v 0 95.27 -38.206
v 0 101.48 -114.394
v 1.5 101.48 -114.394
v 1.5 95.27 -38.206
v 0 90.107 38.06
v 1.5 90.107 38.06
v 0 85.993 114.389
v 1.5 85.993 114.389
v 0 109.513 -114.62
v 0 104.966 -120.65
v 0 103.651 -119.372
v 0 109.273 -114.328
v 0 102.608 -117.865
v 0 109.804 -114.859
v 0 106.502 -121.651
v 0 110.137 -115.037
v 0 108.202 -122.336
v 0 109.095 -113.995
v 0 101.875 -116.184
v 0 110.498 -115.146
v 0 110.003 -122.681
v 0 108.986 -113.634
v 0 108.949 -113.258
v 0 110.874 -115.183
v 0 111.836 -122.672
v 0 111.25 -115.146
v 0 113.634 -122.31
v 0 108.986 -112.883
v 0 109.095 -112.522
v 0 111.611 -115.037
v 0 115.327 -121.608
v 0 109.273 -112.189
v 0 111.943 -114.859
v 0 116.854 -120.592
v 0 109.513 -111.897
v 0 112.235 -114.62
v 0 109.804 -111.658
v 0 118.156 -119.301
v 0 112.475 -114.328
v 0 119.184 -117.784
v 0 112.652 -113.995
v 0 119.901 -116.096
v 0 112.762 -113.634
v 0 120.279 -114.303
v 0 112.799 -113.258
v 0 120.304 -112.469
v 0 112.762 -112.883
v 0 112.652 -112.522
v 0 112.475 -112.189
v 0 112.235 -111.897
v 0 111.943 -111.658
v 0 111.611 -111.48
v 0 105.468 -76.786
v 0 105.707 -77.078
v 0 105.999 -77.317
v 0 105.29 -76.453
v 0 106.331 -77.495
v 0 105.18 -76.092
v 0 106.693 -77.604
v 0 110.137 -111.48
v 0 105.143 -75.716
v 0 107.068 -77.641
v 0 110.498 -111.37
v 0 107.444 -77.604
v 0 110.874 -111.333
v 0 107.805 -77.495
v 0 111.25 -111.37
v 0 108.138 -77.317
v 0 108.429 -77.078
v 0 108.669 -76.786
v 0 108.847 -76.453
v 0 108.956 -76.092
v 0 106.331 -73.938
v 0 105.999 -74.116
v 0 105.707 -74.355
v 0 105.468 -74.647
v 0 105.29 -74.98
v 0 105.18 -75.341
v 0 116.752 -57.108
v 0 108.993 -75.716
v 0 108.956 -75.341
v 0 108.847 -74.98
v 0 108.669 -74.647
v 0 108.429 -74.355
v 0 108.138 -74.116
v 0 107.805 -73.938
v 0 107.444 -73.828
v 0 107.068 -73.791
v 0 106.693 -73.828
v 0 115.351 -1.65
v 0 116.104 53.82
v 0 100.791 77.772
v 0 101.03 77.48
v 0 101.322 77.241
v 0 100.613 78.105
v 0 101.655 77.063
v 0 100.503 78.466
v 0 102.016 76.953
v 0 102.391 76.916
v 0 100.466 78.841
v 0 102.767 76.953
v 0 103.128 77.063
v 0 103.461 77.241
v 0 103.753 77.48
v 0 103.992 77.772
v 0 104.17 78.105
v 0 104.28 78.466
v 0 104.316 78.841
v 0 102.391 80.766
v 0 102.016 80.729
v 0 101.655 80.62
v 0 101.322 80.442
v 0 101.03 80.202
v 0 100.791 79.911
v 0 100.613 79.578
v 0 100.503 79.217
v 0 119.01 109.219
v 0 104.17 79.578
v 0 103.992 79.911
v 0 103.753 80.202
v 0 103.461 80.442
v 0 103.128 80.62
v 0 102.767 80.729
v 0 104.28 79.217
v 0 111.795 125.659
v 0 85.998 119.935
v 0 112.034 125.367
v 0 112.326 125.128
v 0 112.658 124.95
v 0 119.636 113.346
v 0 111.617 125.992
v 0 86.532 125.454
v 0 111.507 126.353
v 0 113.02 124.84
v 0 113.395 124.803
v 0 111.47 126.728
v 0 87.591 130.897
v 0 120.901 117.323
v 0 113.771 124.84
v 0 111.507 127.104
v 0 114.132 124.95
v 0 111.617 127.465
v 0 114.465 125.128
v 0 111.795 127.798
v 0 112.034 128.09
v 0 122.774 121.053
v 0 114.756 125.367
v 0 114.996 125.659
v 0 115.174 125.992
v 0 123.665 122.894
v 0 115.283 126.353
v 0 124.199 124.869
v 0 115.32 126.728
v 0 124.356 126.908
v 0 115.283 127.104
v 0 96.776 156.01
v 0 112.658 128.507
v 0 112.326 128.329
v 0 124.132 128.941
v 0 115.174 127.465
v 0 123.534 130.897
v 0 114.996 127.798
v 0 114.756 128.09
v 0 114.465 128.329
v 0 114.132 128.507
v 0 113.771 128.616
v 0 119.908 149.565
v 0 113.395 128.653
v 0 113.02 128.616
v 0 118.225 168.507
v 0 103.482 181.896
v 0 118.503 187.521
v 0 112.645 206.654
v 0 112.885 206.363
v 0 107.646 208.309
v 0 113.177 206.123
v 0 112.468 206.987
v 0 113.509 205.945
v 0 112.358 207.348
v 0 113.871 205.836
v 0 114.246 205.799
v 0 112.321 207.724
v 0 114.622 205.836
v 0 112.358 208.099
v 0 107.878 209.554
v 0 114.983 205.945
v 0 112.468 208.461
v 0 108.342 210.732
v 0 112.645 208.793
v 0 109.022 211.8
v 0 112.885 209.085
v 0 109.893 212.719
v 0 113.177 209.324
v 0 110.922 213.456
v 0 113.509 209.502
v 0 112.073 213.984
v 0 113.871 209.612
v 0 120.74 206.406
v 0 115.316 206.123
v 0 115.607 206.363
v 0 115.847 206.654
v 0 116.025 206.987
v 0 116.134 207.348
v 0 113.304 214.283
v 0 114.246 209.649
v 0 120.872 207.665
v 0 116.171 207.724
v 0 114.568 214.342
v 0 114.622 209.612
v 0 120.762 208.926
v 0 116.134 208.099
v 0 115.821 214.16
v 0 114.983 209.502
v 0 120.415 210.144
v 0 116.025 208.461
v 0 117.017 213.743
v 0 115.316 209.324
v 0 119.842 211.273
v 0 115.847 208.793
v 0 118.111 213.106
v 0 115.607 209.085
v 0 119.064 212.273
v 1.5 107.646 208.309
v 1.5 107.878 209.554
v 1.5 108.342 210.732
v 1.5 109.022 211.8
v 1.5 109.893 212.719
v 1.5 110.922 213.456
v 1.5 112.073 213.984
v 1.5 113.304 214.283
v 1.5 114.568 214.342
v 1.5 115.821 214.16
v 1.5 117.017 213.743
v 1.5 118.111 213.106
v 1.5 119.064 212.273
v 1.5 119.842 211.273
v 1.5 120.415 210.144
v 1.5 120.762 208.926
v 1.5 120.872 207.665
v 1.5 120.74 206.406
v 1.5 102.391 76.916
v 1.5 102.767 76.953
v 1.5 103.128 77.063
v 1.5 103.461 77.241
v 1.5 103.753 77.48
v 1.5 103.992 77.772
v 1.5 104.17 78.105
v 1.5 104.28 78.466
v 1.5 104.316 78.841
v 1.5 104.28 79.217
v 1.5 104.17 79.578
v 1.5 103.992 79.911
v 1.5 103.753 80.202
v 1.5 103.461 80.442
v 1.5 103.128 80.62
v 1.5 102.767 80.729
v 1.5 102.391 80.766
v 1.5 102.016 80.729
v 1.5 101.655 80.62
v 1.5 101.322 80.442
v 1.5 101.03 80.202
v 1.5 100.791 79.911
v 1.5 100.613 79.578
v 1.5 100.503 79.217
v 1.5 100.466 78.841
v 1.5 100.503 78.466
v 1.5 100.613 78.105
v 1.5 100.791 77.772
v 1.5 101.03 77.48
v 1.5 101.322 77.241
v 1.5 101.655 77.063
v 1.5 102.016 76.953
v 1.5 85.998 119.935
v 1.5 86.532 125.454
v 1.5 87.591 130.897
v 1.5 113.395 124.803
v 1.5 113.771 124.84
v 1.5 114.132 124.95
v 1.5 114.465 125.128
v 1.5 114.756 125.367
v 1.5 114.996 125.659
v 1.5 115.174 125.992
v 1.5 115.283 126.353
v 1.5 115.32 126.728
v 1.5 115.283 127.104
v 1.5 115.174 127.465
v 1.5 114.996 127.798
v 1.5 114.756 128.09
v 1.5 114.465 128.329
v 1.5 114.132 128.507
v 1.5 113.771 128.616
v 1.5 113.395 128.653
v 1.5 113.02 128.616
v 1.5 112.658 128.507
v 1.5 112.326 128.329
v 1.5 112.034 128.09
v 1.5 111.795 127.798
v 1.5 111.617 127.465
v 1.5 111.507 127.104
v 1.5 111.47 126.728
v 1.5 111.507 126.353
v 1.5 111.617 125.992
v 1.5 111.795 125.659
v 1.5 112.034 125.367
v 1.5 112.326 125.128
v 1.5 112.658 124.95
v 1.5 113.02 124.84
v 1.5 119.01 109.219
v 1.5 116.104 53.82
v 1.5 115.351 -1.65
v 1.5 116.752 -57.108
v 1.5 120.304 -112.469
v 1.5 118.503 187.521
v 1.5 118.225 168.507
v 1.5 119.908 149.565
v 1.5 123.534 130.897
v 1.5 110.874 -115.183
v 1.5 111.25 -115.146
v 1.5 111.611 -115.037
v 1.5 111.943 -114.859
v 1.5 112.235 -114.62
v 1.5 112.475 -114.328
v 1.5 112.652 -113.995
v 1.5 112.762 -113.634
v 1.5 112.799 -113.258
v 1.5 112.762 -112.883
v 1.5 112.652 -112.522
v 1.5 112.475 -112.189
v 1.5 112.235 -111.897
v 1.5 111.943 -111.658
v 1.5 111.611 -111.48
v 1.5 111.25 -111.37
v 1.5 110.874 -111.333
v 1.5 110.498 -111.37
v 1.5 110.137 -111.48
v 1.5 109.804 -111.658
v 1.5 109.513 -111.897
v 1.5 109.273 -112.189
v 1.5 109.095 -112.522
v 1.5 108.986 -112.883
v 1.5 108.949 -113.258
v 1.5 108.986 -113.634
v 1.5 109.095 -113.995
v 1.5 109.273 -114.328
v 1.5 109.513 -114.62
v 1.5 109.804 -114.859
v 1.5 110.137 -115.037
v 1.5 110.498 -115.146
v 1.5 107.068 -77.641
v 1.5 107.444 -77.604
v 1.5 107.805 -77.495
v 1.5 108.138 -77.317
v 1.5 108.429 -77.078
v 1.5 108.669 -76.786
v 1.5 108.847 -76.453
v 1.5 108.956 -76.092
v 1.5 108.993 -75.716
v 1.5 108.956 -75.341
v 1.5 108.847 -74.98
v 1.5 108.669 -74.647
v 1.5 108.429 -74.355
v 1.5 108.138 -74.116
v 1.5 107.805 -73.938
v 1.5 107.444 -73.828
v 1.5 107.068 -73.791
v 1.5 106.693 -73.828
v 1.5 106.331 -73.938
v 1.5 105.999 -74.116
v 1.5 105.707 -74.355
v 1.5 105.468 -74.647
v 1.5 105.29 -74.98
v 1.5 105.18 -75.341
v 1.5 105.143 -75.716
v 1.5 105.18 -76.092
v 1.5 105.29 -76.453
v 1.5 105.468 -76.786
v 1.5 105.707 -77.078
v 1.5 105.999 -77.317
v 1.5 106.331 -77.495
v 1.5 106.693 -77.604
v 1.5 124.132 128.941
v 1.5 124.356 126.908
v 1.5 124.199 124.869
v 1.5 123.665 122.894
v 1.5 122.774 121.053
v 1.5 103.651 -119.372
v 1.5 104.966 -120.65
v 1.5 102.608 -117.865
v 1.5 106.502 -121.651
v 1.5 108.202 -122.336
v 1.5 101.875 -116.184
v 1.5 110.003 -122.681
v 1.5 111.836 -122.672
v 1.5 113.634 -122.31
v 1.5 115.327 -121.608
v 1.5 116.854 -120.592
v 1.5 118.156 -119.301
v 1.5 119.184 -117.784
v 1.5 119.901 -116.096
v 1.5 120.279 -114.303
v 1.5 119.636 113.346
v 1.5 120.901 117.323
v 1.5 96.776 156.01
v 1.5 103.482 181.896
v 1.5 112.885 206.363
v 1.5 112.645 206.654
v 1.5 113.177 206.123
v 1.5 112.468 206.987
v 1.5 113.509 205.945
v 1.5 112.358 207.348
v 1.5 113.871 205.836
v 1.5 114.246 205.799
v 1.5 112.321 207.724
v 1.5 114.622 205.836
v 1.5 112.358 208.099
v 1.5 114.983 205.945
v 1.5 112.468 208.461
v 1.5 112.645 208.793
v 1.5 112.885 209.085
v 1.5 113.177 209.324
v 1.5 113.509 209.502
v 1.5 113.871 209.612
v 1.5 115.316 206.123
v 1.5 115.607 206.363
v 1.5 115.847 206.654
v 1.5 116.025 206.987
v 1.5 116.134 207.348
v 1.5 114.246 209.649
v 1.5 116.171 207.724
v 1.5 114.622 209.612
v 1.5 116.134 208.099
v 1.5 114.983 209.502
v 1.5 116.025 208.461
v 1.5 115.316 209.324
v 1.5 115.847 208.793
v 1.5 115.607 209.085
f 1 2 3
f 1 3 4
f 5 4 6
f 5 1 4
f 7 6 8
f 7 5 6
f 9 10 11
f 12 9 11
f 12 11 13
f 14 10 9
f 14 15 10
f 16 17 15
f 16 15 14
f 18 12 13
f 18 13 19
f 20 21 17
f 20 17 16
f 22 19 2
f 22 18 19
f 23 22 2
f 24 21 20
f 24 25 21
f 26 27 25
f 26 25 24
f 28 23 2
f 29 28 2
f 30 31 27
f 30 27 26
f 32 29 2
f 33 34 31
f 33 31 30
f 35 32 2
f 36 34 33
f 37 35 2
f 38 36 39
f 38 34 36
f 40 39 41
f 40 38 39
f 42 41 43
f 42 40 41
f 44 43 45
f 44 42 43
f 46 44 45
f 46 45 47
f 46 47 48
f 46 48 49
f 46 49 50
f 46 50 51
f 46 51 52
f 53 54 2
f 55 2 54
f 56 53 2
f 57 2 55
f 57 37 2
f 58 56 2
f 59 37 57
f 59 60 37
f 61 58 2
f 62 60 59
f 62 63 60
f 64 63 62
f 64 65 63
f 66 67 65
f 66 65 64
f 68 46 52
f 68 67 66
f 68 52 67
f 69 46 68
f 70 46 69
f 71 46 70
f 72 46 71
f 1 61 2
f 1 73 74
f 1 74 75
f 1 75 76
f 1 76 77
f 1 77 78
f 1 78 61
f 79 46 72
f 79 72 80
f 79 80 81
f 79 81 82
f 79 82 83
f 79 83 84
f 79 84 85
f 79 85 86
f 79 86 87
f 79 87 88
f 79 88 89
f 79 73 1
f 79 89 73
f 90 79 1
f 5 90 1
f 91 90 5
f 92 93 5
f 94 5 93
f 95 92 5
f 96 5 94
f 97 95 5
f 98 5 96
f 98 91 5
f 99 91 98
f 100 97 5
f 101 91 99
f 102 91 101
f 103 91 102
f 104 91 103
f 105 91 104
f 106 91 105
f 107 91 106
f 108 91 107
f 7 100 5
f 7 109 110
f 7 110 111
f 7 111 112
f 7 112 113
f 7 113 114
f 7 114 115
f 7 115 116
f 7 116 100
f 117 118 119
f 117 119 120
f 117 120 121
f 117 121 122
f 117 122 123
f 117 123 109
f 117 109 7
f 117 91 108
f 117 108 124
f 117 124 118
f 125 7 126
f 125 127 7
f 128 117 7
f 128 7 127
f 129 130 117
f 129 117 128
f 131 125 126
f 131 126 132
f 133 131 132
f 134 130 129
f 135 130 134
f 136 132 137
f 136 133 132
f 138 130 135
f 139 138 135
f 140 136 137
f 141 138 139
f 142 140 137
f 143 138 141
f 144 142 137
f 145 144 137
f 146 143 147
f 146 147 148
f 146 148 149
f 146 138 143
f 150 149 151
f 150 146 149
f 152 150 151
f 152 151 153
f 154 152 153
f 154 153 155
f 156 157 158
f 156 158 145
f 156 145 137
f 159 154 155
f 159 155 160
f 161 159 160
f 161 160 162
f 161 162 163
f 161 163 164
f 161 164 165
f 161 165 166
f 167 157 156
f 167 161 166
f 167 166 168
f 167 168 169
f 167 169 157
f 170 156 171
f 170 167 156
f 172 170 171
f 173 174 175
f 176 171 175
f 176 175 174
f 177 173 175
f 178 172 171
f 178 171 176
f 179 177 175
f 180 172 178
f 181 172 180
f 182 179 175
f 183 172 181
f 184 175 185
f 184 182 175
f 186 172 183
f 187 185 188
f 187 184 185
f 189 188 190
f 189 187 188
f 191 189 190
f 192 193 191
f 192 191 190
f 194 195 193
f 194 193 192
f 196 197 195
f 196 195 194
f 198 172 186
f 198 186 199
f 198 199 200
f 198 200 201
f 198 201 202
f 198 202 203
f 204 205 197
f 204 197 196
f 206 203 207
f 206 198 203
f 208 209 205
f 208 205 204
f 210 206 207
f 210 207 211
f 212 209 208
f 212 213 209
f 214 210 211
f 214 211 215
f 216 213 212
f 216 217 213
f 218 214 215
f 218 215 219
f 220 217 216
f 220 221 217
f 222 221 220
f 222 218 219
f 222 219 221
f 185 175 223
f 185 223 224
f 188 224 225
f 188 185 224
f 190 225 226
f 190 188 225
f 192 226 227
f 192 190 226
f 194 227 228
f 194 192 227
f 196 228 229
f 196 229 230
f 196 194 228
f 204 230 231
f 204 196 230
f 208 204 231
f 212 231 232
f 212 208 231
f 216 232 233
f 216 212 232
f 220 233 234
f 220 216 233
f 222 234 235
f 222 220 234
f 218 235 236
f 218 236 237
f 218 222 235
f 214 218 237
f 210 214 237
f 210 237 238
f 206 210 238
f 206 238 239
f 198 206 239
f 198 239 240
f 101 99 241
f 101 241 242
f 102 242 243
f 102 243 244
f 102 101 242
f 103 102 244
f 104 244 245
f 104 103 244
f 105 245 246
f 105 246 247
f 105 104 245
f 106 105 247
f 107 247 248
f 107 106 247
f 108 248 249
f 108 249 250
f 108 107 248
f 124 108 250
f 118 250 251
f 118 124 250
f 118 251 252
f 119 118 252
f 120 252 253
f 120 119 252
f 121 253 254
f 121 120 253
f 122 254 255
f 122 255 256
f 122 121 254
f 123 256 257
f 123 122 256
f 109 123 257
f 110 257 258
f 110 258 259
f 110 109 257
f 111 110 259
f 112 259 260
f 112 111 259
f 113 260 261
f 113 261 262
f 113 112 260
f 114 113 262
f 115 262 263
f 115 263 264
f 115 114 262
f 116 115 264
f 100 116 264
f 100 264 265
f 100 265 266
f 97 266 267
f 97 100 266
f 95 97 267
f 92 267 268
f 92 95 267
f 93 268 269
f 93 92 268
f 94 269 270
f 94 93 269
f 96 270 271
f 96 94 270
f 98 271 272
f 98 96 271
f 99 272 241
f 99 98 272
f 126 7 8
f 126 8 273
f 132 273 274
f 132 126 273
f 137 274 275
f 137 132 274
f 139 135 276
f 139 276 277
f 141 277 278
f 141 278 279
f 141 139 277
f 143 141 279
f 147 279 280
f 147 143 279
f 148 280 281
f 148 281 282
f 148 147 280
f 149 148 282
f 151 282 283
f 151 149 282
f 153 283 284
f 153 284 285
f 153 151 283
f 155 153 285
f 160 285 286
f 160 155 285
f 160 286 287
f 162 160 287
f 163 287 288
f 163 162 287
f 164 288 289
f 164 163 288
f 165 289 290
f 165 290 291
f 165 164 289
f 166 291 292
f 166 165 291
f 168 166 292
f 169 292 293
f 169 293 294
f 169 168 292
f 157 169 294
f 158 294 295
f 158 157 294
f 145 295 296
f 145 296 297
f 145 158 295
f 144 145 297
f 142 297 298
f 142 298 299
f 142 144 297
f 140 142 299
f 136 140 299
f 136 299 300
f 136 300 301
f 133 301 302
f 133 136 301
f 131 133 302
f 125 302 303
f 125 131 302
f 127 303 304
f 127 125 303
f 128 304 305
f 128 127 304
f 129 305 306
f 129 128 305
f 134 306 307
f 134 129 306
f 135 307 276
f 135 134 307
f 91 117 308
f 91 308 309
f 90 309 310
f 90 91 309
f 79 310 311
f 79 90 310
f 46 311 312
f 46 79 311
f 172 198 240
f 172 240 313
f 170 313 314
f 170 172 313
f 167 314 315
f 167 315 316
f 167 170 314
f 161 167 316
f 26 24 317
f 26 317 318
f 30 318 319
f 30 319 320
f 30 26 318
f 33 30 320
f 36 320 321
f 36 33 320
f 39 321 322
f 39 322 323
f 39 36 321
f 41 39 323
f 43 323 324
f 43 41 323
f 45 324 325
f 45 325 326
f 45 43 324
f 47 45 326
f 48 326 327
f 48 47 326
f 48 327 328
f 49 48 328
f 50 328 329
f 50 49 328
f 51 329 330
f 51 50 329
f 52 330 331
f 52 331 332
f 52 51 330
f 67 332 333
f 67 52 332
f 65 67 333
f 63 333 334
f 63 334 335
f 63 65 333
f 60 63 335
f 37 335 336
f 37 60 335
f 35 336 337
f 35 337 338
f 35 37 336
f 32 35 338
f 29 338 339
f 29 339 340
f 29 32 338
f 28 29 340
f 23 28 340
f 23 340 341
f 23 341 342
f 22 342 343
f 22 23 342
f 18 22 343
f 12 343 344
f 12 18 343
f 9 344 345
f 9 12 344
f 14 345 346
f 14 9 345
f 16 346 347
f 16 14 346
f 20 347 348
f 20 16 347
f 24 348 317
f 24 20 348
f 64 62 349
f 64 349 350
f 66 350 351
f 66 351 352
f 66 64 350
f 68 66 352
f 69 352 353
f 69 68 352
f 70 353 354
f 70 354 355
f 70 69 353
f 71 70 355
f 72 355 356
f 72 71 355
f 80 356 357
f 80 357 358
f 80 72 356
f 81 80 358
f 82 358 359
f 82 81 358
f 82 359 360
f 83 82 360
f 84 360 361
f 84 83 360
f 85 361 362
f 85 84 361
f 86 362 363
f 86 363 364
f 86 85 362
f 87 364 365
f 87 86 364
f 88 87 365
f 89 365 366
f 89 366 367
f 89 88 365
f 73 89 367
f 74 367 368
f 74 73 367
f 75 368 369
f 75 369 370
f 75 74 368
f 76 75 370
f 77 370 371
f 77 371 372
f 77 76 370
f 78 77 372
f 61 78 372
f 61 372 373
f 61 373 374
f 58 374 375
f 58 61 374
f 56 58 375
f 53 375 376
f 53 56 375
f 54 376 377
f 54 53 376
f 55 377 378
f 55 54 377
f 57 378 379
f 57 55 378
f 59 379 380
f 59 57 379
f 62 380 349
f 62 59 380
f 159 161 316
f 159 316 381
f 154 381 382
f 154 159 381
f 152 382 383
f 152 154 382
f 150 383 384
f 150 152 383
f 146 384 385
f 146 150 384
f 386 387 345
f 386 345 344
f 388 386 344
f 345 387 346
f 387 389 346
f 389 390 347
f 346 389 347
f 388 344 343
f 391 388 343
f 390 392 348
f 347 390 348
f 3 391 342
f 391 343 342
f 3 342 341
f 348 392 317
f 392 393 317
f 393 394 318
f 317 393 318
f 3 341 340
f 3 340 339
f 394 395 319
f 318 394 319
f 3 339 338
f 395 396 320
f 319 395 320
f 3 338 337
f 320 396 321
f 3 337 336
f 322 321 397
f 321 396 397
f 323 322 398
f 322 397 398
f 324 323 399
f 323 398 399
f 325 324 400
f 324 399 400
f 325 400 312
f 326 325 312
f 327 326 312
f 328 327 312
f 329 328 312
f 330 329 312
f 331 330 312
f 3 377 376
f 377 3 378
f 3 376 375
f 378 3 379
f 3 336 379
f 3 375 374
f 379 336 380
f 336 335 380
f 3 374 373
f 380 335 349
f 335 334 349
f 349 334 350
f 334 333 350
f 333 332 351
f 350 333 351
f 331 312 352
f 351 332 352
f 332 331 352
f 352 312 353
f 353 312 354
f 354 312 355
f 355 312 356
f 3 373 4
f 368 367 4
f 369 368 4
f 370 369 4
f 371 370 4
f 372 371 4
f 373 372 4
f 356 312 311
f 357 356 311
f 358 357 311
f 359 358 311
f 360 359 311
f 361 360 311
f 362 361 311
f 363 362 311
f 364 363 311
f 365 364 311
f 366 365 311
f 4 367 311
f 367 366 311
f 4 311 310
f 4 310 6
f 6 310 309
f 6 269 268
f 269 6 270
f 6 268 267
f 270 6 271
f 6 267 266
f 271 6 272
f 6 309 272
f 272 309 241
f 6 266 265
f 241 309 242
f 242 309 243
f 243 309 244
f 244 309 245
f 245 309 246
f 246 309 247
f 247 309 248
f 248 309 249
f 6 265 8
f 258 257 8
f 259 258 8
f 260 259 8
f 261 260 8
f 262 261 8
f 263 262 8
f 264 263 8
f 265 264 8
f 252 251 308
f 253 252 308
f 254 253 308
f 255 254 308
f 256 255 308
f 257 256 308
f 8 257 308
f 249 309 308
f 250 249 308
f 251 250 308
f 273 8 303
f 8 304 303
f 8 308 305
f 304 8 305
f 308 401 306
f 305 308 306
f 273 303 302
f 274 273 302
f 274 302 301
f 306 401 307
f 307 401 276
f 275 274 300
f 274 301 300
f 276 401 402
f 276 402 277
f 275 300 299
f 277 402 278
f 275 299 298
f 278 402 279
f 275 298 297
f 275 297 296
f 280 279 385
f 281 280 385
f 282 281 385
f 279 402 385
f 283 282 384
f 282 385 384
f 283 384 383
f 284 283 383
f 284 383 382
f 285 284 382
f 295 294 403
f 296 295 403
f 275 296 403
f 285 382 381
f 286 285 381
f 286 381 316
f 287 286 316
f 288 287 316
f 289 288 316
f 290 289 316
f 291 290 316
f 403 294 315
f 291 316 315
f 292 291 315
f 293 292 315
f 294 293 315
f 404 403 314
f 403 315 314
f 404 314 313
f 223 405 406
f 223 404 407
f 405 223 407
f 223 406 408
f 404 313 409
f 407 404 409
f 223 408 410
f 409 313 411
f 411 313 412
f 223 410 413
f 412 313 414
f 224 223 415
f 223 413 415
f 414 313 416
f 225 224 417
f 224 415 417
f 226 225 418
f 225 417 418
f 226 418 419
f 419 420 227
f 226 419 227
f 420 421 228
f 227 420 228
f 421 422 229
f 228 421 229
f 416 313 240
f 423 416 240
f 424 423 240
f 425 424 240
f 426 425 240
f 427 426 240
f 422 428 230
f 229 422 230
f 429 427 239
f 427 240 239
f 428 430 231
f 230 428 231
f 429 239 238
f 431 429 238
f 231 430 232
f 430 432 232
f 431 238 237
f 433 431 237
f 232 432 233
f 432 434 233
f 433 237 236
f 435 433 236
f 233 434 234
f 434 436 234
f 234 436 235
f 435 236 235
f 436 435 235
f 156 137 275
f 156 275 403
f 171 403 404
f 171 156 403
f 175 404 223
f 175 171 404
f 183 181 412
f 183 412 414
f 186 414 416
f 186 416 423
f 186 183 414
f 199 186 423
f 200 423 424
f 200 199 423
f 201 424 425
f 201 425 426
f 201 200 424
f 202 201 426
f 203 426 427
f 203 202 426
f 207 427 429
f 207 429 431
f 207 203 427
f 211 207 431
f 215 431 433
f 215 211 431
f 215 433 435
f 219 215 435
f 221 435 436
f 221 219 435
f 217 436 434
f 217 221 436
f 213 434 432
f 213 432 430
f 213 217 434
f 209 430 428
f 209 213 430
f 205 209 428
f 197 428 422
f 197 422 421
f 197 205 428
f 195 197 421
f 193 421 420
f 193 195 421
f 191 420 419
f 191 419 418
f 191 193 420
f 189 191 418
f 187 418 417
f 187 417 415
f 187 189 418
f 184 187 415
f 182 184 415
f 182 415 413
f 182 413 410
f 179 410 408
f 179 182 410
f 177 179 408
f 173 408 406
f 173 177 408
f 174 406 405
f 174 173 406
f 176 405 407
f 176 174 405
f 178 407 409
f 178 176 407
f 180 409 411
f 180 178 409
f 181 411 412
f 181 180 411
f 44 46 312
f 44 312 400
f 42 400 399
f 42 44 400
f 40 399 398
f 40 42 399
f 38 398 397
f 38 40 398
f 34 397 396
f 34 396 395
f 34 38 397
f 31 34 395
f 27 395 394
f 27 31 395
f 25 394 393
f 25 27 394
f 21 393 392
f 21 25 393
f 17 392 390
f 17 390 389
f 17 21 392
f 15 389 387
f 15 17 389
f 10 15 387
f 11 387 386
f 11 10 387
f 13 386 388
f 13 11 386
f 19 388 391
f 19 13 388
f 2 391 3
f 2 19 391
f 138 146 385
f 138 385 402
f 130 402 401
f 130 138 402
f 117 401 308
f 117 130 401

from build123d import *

# Parameters (mm, degrees)
SKETCH_1_R      = 1.925
EXTRUDE_1_DEPTH = 1.5


with BuildPart() as part:
    # 草圖1 → 填料-伸長1 (new body)
    with BuildSketch(Plane(origin=(0, 0, 0), x_dir=(0, 0, -1), z_dir=(1, 0, 0))):
        with BuildLine():
            ThreePointArc((-130.897263822, 87.591071909), (-168.871615346, 100.442909595), (-208.309414447, 107.64576373))
            ThreePointArc((-208.309414447, 107.64576373), (-214.28117701, 115.199320657), (-206.405854958, 120.739850681))
            ThreePointArc((-206.405854958, 120.739850681), (-168.506781938, 118.224744692), (-130.897263822, 123.534136472))
            ThreePointArc((-130.897263822, 123.534136472), (-125.884787037, 124.325252138), (-121.053064598, 122.774366651))
            ThreePointArc((-121.053064598, 122.774366651), (-115.359208766, 120.190083617), (-109.218730551, 119.009812321))
            ThreePointArc((-109.218730551, 119.009812321), (1.650442282, 115.351316794), (112.469361248, 120.30361659))
            ThreePointArc((112.469361248, 120.30361659), (122.671923792, 111.836409472), (114.393924171, 101.479740068))
            ThreePointArc((114.393924171, 101.479740068), (0.082126176, 92.557578457), (-114.38926471, 85.993068006))
            ThreePointArc((-114.38926471, 85.993068006), (-122.70068315, 86.198910651), (-130.897263822, 87.591071909))
        make_face()
        with Locations((113.258391089, 110.873964994)):
            Circle(SKETCH_1_R, mode=Mode.SUBTRACT)
        with Locations((-207.723896624, 114.246052716)):
            Circle(SKETCH_1_R, mode=Mode.SUBTRACT)
        with Locations((-78.841316581, 102.391494034)):
            Circle(SKETCH_1_R, mode=Mode.SUBTRACT)
        with Locations((-126.72836608, 113.395152076)):
            Circle(SKETCH_1_R, mode=Mode.SUBTRACT)
        with Locations((75.716339506, 107.068132225)):
            Circle(SKETCH_1_R, mode=Mode.SUBTRACT)
    extrude(amount=EXTRUDE_1_DEPTH)


solid = part.part
